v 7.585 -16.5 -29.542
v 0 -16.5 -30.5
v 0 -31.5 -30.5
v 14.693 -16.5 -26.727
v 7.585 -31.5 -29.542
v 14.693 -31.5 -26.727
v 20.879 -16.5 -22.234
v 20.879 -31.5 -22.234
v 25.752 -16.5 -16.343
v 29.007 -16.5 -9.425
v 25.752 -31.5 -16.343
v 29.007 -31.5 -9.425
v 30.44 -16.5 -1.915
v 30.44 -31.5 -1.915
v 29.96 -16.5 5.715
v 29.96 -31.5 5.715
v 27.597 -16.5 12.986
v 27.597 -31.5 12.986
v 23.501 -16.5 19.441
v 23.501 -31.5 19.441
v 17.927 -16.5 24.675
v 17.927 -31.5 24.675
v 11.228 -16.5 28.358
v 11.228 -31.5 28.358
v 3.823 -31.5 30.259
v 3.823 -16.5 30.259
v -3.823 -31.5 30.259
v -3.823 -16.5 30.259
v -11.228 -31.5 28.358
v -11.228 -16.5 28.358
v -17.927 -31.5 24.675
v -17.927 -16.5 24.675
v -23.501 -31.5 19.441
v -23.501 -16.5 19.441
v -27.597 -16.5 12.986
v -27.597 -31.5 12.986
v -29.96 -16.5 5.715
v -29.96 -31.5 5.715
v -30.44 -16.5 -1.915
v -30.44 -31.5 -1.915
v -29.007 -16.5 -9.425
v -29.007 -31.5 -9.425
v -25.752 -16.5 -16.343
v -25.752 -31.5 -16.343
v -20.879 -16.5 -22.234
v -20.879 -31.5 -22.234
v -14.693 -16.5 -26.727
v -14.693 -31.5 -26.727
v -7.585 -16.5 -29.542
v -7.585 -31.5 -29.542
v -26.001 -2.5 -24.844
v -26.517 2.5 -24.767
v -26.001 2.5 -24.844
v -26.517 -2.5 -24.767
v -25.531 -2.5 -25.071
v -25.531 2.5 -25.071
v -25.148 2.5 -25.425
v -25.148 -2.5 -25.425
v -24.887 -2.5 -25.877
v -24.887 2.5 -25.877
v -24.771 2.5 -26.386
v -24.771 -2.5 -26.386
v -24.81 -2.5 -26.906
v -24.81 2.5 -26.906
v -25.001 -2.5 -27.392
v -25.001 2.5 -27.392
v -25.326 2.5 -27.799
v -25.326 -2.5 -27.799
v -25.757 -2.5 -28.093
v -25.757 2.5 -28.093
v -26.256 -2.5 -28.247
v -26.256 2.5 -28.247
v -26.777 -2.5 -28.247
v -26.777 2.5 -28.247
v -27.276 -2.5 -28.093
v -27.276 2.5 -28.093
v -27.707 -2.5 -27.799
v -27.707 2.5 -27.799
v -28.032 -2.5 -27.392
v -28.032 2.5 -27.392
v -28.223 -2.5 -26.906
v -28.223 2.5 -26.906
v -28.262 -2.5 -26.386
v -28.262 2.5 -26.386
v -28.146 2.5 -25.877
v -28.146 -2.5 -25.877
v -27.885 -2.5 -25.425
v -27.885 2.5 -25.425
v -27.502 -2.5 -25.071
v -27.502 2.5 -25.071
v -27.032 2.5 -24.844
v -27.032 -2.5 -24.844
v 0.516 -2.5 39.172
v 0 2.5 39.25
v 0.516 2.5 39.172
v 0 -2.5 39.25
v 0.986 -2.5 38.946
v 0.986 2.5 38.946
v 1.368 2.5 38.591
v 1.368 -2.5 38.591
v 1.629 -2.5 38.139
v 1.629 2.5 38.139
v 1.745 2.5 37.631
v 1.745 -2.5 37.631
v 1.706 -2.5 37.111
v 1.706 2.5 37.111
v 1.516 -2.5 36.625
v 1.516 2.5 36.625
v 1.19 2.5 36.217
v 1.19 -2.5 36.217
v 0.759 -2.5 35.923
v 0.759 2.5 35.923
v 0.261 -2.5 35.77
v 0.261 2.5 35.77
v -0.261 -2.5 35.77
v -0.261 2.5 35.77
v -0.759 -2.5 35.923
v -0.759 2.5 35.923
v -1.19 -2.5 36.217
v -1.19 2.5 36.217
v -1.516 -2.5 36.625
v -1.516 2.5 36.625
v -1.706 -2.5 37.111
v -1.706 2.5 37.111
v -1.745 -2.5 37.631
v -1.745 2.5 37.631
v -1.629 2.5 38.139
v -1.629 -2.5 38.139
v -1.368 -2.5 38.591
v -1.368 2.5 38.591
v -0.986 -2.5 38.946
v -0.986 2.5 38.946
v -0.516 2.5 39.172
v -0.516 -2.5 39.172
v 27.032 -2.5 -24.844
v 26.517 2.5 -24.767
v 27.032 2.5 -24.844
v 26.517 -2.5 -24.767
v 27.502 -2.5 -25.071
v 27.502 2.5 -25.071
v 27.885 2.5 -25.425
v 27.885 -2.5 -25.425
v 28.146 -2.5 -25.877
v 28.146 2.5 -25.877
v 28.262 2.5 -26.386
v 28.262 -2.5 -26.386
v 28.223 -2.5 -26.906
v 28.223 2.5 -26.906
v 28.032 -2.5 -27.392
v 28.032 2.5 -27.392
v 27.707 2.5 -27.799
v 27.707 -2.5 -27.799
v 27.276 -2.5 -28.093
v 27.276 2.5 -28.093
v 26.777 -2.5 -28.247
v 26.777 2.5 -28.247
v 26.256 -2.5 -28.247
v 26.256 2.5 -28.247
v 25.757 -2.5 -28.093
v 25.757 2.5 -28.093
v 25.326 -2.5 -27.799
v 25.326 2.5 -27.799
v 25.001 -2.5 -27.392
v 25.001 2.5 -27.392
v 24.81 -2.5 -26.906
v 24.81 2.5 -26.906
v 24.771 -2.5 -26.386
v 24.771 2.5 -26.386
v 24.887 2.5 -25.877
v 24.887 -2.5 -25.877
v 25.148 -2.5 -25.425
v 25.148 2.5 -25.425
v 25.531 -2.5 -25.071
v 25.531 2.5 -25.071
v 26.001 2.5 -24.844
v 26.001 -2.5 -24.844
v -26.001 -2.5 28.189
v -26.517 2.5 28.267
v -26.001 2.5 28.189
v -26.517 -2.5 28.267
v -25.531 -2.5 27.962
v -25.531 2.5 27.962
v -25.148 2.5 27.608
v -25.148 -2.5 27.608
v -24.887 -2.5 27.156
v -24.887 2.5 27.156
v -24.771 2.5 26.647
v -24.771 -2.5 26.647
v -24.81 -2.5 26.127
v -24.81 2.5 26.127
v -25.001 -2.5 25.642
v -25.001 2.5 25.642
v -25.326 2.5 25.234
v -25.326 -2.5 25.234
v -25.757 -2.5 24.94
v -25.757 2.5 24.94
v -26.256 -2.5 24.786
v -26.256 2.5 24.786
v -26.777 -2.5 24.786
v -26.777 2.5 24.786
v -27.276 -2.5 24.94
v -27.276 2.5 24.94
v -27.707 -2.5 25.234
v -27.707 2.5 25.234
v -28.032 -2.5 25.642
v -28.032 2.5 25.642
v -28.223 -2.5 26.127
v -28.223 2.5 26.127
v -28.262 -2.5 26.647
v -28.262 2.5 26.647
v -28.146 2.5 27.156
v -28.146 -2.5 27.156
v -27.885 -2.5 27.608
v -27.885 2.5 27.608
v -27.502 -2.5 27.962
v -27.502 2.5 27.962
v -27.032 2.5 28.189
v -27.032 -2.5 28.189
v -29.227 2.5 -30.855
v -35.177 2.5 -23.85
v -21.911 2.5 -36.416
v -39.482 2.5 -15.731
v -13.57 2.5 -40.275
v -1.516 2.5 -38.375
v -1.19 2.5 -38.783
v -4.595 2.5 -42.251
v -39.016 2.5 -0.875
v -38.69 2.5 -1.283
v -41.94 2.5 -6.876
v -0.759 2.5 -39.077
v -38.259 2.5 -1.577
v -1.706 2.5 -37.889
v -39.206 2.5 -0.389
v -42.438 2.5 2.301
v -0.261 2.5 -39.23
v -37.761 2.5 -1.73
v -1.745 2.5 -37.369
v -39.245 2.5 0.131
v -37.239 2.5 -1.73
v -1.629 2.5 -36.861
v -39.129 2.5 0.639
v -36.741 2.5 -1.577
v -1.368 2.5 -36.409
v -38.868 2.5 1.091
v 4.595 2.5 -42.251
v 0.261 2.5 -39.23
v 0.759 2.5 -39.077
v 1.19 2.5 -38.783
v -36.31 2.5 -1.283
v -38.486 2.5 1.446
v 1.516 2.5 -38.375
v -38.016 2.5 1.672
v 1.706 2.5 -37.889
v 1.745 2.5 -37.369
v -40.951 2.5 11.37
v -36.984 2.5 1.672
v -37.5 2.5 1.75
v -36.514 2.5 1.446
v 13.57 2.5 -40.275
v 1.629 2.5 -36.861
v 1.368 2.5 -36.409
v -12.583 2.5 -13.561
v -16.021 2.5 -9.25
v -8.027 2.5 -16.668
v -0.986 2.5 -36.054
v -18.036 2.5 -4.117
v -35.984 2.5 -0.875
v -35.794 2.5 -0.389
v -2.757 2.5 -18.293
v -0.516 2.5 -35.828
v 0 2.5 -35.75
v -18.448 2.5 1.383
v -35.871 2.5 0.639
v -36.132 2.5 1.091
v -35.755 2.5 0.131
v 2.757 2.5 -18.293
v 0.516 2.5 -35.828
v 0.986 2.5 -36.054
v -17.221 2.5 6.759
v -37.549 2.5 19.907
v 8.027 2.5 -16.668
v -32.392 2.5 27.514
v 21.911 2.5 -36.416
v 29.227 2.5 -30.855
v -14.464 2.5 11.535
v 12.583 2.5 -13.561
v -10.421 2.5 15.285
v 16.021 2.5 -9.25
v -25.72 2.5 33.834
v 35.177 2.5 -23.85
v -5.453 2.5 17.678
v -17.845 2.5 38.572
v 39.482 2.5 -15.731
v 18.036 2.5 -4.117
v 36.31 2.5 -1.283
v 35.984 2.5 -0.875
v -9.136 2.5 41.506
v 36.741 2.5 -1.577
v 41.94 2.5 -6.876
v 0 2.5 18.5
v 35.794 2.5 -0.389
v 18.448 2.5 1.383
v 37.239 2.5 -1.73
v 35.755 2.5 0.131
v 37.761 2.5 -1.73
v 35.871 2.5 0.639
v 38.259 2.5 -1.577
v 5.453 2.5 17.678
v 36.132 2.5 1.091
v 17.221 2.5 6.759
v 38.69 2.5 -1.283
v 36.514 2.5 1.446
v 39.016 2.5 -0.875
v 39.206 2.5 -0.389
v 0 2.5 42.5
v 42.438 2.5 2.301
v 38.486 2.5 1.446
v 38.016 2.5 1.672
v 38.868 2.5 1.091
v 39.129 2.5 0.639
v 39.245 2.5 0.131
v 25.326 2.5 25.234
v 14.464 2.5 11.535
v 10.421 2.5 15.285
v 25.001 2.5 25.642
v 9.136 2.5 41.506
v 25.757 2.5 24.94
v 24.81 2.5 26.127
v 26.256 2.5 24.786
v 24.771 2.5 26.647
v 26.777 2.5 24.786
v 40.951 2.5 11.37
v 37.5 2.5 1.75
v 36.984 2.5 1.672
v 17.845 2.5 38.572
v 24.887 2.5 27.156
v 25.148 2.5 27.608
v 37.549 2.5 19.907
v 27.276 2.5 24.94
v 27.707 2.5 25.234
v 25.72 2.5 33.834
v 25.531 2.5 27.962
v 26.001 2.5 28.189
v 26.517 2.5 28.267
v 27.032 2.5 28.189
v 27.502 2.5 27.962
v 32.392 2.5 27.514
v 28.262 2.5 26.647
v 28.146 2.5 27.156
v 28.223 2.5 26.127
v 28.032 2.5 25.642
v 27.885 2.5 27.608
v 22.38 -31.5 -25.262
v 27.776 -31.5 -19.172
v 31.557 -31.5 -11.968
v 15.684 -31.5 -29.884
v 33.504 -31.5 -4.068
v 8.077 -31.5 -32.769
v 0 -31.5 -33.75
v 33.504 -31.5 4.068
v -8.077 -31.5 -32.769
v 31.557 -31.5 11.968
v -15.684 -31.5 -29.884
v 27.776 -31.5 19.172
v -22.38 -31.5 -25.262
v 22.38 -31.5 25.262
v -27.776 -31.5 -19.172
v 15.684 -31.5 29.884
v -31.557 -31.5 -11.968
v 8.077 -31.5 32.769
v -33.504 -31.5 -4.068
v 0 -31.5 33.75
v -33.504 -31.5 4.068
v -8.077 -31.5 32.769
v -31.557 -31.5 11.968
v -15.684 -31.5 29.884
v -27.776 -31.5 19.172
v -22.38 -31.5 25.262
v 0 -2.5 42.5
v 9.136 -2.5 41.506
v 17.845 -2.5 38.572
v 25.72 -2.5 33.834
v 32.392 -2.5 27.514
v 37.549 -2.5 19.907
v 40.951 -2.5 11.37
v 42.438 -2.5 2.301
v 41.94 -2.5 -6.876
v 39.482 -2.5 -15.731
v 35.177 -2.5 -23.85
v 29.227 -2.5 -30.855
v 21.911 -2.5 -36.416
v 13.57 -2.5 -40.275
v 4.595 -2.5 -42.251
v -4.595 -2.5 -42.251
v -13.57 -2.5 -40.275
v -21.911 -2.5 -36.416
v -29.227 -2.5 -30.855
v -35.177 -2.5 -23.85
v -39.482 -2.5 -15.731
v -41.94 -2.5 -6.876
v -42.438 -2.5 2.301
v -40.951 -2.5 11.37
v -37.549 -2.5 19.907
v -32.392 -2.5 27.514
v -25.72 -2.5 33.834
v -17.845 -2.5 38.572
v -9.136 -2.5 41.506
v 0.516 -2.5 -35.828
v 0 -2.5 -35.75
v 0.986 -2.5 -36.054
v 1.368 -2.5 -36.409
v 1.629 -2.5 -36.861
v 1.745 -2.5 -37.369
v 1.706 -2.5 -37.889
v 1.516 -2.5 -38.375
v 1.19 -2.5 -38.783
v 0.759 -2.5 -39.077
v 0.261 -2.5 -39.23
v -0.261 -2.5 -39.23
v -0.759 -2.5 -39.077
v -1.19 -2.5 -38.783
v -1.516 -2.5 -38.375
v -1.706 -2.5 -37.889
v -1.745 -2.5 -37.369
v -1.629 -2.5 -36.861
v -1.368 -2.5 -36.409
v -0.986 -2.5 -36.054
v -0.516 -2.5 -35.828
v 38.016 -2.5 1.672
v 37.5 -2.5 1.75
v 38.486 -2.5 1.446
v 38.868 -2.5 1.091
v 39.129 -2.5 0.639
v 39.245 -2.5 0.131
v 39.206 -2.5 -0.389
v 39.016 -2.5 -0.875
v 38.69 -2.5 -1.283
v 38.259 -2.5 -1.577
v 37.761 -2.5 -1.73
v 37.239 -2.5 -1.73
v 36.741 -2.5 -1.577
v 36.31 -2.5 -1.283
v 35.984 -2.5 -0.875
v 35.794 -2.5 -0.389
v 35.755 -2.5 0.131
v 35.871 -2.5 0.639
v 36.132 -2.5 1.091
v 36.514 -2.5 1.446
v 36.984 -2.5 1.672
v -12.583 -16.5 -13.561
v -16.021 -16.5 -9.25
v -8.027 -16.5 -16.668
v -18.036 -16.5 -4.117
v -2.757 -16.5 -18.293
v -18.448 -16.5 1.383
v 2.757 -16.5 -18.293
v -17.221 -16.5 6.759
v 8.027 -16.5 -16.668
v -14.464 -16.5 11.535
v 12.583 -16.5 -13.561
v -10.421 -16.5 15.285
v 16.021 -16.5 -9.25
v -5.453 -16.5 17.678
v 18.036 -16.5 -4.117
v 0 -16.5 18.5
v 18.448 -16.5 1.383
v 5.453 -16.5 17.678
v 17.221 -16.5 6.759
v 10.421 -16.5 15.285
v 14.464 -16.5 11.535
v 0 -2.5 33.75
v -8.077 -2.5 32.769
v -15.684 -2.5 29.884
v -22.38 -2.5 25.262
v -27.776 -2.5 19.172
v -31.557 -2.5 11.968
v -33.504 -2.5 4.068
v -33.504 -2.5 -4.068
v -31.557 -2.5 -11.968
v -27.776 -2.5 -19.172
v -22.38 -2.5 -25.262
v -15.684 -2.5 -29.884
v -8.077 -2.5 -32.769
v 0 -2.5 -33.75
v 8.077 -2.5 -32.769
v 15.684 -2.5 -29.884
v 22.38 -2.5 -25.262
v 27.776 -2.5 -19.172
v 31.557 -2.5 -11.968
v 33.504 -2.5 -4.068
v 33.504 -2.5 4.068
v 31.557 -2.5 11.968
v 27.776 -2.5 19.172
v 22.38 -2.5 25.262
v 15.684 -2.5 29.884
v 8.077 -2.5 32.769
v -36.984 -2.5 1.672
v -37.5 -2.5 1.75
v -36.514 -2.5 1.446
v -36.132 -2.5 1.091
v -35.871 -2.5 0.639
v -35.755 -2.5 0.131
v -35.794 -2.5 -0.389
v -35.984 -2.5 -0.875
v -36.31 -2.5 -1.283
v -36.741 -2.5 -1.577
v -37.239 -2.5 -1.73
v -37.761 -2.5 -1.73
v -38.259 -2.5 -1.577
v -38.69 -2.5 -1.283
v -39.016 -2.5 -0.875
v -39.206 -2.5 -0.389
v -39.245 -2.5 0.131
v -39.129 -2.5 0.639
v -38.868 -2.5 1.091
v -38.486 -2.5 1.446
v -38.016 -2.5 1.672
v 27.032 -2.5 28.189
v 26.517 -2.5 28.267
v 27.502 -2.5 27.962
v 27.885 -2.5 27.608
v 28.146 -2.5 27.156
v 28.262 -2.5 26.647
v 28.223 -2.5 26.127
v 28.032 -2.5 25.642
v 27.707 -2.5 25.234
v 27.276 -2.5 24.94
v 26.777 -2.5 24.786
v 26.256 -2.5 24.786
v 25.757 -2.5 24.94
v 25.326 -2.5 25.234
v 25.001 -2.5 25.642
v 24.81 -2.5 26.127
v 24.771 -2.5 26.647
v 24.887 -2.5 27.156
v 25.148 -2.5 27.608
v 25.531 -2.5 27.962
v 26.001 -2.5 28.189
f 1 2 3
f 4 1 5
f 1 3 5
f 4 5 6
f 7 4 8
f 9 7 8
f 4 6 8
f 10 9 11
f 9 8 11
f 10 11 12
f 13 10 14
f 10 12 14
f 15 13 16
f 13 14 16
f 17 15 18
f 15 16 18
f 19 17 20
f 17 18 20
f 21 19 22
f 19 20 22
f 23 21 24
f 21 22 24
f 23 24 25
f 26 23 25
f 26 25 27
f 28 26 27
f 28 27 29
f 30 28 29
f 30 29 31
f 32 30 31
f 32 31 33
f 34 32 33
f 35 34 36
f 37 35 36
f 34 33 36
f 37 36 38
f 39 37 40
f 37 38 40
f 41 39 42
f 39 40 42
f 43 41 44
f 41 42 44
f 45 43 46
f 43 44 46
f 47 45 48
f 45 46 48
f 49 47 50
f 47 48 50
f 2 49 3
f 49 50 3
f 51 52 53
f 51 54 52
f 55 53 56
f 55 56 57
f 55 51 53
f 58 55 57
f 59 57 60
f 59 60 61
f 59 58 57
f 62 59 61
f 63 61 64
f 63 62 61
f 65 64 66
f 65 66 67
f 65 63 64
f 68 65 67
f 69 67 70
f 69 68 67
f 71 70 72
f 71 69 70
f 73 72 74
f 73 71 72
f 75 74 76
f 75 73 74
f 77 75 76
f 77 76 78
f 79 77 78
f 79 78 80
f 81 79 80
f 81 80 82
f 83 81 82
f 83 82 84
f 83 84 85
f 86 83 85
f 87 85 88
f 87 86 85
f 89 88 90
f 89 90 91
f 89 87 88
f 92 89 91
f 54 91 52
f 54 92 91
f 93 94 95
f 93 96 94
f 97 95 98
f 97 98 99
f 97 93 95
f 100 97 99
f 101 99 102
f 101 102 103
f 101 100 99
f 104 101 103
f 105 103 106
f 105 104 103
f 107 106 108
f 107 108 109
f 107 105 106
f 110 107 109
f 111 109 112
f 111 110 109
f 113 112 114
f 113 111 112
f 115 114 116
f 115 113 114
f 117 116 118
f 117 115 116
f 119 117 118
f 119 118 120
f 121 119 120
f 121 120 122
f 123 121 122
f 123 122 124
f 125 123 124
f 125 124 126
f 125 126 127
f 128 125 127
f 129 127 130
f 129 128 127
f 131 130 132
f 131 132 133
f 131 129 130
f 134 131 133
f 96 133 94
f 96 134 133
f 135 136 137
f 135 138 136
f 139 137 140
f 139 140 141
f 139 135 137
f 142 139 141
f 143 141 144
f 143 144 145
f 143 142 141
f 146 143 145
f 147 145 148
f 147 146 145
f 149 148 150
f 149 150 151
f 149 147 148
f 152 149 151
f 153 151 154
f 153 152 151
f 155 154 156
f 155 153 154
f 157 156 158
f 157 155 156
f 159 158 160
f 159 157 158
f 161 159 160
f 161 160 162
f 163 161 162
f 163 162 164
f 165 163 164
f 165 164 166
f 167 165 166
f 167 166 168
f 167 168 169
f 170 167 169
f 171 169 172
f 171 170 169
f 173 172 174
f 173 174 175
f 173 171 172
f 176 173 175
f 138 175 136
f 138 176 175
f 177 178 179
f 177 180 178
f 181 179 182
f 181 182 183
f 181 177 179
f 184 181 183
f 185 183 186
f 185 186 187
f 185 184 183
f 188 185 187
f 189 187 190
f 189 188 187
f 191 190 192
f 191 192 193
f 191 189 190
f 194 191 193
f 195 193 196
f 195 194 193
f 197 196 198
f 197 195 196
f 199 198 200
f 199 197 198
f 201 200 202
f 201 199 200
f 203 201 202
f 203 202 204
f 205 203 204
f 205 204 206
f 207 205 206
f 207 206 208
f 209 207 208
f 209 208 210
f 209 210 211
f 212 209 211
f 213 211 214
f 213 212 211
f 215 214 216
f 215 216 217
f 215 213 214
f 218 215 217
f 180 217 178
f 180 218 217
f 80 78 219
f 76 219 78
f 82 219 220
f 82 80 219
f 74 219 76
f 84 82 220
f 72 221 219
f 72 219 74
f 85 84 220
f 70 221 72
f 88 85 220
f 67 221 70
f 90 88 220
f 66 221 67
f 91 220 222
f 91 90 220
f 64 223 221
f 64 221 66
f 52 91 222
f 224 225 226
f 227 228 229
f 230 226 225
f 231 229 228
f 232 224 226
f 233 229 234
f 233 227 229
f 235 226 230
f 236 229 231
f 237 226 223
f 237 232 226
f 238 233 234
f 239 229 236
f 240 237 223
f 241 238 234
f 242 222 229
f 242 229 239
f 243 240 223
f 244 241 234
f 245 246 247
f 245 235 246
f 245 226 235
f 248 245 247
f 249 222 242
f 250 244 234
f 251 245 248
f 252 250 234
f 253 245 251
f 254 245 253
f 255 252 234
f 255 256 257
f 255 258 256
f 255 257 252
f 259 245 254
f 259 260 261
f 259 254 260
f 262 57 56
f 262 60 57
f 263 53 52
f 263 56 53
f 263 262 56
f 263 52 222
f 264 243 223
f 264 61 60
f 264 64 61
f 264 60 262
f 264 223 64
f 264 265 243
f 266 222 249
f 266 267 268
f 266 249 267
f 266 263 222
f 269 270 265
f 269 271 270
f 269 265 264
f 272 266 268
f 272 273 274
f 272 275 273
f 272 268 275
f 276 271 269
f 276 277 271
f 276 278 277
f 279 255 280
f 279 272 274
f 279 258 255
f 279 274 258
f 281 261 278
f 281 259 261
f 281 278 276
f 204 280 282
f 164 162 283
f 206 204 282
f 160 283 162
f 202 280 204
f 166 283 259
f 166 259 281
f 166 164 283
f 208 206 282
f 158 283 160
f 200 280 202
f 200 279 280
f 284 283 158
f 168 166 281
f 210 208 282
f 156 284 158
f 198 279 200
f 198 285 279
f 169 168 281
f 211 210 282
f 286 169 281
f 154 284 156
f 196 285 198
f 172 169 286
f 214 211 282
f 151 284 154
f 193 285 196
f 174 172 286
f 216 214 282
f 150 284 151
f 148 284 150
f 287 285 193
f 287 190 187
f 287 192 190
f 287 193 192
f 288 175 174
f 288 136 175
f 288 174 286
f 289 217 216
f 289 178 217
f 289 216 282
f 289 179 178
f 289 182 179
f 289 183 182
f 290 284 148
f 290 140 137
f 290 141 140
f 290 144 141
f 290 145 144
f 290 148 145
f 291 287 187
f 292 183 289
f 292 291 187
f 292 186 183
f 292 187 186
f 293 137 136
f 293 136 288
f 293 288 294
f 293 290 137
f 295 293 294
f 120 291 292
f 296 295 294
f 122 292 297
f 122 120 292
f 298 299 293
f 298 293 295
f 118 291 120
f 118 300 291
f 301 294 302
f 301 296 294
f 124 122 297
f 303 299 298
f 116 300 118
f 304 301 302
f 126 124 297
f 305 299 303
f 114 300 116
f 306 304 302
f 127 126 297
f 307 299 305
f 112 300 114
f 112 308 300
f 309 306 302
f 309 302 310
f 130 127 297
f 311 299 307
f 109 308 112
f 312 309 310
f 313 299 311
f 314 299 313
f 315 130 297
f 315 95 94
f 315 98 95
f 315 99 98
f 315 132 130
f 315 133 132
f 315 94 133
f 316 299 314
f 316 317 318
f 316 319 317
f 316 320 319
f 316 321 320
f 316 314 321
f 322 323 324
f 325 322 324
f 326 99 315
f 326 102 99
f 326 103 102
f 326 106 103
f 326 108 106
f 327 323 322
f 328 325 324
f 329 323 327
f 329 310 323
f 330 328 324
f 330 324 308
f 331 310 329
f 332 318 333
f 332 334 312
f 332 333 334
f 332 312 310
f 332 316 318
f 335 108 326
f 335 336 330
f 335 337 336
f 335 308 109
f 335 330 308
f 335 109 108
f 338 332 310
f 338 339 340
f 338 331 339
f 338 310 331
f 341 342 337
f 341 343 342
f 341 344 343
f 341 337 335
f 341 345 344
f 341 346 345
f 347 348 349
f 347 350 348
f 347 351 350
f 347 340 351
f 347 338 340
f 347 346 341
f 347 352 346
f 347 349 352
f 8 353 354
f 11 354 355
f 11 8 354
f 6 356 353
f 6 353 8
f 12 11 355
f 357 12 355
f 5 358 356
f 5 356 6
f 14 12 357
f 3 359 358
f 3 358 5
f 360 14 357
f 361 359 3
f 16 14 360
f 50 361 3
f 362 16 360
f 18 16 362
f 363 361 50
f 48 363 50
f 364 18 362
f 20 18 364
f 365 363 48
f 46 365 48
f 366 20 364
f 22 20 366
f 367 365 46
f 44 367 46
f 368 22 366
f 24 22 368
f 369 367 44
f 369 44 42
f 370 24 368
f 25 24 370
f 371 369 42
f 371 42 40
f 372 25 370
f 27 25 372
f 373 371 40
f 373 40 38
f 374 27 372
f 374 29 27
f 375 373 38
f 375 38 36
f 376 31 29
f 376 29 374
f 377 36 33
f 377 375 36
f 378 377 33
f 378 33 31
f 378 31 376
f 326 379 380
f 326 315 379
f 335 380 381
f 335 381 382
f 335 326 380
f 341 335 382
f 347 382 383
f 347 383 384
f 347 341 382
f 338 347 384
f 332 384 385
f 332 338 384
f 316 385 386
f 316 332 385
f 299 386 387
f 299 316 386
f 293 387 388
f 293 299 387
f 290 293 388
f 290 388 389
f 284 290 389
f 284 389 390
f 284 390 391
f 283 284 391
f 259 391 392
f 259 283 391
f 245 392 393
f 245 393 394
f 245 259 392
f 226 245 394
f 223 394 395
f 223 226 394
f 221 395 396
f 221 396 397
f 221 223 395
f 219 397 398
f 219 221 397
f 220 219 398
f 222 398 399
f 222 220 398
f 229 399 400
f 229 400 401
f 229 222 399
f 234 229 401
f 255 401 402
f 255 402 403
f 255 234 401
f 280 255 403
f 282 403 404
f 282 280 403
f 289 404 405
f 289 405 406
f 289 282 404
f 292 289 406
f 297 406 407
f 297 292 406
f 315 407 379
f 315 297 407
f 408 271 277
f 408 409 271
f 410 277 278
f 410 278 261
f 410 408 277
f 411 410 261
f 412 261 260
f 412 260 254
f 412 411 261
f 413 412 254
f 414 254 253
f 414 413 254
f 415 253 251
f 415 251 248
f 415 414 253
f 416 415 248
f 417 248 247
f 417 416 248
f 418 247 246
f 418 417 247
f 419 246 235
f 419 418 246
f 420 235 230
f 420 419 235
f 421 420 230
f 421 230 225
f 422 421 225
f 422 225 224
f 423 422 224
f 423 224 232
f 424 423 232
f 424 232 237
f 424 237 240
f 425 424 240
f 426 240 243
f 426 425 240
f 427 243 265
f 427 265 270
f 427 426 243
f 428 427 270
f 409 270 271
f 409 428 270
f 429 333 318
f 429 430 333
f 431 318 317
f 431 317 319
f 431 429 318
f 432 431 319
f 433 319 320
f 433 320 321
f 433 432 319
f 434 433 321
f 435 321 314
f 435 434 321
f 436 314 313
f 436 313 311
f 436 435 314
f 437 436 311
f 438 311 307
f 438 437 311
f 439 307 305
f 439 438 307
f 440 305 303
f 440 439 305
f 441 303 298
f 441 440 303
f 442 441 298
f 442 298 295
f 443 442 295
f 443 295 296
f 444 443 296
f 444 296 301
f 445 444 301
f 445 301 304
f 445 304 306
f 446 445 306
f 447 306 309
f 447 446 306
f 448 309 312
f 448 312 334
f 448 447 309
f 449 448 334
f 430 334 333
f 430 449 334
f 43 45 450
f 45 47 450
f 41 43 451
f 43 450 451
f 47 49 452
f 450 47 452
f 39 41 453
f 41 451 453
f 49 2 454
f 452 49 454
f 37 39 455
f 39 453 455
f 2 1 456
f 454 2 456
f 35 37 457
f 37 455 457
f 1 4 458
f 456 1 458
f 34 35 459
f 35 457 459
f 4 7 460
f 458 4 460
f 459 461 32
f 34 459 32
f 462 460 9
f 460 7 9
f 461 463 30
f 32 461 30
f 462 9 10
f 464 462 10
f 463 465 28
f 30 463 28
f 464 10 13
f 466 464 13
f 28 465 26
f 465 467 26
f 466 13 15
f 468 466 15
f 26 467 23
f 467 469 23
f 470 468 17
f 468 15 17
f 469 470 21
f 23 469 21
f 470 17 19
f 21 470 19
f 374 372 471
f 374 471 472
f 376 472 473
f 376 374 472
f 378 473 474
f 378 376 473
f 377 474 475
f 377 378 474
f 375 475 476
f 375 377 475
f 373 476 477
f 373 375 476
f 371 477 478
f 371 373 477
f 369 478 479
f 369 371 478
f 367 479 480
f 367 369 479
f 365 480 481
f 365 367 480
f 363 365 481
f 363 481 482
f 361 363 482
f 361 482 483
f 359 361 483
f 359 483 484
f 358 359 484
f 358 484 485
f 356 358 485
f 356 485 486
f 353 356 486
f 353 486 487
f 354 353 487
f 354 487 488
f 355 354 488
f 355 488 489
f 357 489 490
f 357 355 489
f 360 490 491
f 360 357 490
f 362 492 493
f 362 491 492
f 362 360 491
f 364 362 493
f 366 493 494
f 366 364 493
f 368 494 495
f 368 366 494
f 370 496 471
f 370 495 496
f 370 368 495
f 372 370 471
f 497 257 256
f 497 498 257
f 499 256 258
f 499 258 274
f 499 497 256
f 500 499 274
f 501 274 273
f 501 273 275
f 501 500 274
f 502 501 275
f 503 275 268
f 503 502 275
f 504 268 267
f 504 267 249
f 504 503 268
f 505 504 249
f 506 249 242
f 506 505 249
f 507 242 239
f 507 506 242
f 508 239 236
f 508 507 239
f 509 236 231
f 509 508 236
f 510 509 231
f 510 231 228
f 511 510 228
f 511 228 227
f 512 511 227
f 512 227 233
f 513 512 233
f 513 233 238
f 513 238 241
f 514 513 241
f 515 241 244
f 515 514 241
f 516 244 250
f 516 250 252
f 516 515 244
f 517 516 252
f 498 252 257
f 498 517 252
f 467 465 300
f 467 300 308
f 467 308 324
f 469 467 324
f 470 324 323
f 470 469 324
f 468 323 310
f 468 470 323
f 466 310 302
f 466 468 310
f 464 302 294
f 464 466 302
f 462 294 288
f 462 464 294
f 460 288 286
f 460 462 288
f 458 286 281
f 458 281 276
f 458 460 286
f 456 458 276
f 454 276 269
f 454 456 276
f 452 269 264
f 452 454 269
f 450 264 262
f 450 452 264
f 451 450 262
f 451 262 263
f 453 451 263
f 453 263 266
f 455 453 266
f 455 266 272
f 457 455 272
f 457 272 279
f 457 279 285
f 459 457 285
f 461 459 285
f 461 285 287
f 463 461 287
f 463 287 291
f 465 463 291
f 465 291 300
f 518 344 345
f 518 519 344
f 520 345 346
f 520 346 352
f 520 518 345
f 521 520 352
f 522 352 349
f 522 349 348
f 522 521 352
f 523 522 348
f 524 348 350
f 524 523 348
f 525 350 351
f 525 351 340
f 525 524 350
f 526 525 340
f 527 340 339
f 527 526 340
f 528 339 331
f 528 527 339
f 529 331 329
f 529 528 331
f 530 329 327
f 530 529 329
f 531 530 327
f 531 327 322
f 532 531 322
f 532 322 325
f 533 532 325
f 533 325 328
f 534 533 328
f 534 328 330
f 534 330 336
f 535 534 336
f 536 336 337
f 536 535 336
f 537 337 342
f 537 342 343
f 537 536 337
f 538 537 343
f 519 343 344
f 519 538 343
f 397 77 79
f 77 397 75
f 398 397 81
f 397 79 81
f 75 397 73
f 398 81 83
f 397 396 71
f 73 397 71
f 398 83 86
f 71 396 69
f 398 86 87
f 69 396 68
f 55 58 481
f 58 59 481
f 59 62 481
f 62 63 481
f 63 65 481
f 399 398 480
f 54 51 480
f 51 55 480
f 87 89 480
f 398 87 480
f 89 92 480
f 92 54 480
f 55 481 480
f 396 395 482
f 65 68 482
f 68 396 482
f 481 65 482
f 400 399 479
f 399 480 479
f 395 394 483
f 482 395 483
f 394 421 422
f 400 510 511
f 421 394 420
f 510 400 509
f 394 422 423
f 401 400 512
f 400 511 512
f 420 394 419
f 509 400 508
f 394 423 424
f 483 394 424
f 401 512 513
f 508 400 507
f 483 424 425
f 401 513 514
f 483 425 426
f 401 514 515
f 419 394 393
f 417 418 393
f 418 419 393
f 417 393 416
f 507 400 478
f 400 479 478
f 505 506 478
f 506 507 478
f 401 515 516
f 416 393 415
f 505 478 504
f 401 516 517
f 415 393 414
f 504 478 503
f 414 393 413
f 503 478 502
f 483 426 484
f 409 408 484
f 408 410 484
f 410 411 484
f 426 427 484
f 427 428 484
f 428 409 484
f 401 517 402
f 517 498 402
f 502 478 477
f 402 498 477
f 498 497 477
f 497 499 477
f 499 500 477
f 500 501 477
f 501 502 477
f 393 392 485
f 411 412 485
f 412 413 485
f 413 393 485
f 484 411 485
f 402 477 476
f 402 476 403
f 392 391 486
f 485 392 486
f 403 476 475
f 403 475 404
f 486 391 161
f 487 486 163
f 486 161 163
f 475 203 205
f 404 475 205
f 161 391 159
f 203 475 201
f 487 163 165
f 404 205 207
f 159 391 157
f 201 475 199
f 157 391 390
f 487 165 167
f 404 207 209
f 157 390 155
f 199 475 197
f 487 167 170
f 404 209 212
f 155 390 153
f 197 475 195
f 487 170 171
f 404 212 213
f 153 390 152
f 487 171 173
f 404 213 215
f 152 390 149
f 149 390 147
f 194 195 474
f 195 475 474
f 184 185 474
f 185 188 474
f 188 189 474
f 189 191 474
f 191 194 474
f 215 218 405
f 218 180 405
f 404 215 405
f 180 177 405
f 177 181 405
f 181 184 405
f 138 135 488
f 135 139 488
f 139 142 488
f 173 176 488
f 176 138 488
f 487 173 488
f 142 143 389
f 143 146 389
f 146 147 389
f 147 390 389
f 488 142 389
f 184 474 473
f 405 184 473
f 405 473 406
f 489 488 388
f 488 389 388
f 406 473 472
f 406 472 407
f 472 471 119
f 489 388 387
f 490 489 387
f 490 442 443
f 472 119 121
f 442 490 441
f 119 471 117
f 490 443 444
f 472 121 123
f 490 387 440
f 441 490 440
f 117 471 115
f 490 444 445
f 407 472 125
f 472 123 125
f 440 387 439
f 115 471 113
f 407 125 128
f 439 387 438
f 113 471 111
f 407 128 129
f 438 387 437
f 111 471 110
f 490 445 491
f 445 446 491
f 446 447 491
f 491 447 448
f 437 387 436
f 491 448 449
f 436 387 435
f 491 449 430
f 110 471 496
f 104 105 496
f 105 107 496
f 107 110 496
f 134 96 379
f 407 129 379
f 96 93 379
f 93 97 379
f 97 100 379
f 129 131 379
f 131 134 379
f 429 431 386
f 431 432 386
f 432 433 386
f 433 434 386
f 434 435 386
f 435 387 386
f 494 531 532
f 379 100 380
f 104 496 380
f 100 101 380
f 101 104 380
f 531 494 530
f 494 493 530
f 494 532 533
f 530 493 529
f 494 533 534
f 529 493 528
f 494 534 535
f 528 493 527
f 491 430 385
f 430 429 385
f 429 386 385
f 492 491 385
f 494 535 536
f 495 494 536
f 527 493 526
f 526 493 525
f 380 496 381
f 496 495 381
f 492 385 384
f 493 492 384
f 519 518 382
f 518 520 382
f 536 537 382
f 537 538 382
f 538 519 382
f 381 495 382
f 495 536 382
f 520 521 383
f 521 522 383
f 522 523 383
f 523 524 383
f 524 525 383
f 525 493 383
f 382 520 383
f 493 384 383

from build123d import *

# Parameters (mm, degrees)
SKETCH1_R           = 42.5
SKETCH1_R_2         = 18.5
SKETCH1_R_3         = 1.75
BOSS_EXTRUDE1_DEPTH = 2.5
BOSS_EXTRUDE2_START = -14
SKETCH2_R           = 33.75
SKETCH2_R_2         = 18.5
BOSS_EXTRUDE2_DEPTH = 14
BOSS_EXTRUDE3_START = 15
SKETCH3_R           = 33.75
SKETCH3_R_2         = 30.5
BOSS_EXTRUDE3_DEPTH = 15


with BuildPart() as part:
    # Sketch1 → Boss-Extrude1 (new, symmetric)
    with BuildSketch(Plane(origin=(0, 0, 0), x_dir=(1, 0, 0), z_dir=(0, 1, 0))):
        with Locations(Location((0, 0, 0), (0, 0, 270))):
            Circle(SKETCH1_R)
        with Locations(Location((0, 0, 0), (0, 0, 270))):
            Circle(SKETCH1_R_2, mode=Mode.SUBTRACT)
        with Locations(Location((0, 37.5, 0), (0, 0, 270))):
            Circle(SKETCH1_R_3, mode=Mode.SUBTRACT)
        with Locations(Location((26.516504294, 26.516504294, 0), (0, 0, 270))):
            Circle(SKETCH1_R_3, mode=Mode.SUBTRACT)
        with Locations(Location((37.5, 0, 0), (0, 0, 270))):
            Circle(SKETCH1_R_3, mode=Mode.SUBTRACT)
        with Locations(Location((26.516504294, -26.516504294, 0), (0, 0, 270))):
            Circle(SKETCH1_R_3, mode=Mode.SUBTRACT)
        with Locations(Location((0, -37.5, 0), (0, 0, 270))):
            Circle(SKETCH1_R_3, mode=Mode.SUBTRACT)
        with Locations(Location((-26.516504294, -26.516504294, 0), (0, 0, 270))):
            Circle(SKETCH1_R_3, mode=Mode.SUBTRACT)
        with Locations(Location((-37.5, 0, 0), (0, 0, 270))):
            Circle(SKETCH1_R_3, mode=Mode.SUBTRACT)
        with Locations(Location((-26.516504294, 26.516504294, 0), (0, 0, 270))):
            Circle(SKETCH1_R_3, mode=Mode.SUBTRACT)
    extrude(amount=BOSS_EXTRUDE1_DEPTH, both=True)

    # Sketch2 → Boss-Extrude2 (add)
    with BuildSketch(Plane(origin=(0, -2.5, 0), x_dir=(1, 0, 0), z_dir=(0, 1, 0)).offset(BOSS_EXTRUDE2_START)):
        with Locations(Location((0, 0, 0), (0, 0, 270))):
            Circle(SKETCH2_R)
        with Locations(Location((0, 0, 0), (0, 0, 270))):
            Circle(SKETCH2_R_2, mode=Mode.SUBTRACT)
    extrude(amount=BOSS_EXTRUDE2_DEPTH)

    # Sketch3 → Boss-Extrude3 (add)
    with BuildSketch(Plane.XZ.offset(16.5).offset(BOSS_EXTRUDE3_START)):
        with Locations(Location((0, 0, 0), (0, 0, 90))):
            Circle(SKETCH3_R)
        with Locations(Location((0, 0, 0), (0, 0, 270))):
            Circle(SKETCH3_R_2, mode=Mode.SUBTRACT)
    extrude(amount=-BOSS_EXTRUDE3_DEPTH)


solid = part.part
